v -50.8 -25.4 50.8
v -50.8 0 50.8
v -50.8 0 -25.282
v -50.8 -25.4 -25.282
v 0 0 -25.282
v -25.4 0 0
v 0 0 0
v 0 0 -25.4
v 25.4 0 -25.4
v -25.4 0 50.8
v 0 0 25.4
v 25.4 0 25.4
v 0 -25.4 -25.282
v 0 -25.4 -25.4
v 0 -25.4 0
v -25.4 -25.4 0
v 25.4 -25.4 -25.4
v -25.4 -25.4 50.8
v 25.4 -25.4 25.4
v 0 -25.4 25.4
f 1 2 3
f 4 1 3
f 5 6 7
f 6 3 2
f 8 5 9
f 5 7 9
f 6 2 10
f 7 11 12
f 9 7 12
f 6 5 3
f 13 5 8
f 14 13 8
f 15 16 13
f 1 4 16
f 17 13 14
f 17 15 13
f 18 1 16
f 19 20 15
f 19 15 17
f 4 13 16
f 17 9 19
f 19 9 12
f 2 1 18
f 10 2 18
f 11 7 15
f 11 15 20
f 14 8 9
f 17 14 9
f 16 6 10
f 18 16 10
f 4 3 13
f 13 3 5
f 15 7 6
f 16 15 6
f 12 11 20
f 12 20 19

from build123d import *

# Parameters (mm, degrees)
F0_W     = 25.4
F0_H     = 25.4
F0_H_2   = 25.282406
F1_DEPTH = 25.4


with BuildPart() as f1:
    # F0 (on Front) → F1 (new body)
    with BuildSketch(Plane.XZ):
        with Locations((-38.1, 38.1)):
            Rectangle(F0_W, F0_H)
        with Locations((-38.1, 12.7)):
            Rectangle(F0_W, F0_H)
        with Locations((-38.1, -12.641203)):
            Rectangle(F0_W, F0_H_2)
        with Locations((-12.7, -12.641203)):
            Rectangle(F0_W, F0_H_2)
        Polygon((25.4, 0), (0, 0), (0, -25.282406), (0, -25.4), (25.4, -25.4), align=None)
        with Locations((12.7, 12.7)):
            Rectangle(F0_W, F0_H)
    extrude(amount=F1_DEPTH)


solid = f1.part
